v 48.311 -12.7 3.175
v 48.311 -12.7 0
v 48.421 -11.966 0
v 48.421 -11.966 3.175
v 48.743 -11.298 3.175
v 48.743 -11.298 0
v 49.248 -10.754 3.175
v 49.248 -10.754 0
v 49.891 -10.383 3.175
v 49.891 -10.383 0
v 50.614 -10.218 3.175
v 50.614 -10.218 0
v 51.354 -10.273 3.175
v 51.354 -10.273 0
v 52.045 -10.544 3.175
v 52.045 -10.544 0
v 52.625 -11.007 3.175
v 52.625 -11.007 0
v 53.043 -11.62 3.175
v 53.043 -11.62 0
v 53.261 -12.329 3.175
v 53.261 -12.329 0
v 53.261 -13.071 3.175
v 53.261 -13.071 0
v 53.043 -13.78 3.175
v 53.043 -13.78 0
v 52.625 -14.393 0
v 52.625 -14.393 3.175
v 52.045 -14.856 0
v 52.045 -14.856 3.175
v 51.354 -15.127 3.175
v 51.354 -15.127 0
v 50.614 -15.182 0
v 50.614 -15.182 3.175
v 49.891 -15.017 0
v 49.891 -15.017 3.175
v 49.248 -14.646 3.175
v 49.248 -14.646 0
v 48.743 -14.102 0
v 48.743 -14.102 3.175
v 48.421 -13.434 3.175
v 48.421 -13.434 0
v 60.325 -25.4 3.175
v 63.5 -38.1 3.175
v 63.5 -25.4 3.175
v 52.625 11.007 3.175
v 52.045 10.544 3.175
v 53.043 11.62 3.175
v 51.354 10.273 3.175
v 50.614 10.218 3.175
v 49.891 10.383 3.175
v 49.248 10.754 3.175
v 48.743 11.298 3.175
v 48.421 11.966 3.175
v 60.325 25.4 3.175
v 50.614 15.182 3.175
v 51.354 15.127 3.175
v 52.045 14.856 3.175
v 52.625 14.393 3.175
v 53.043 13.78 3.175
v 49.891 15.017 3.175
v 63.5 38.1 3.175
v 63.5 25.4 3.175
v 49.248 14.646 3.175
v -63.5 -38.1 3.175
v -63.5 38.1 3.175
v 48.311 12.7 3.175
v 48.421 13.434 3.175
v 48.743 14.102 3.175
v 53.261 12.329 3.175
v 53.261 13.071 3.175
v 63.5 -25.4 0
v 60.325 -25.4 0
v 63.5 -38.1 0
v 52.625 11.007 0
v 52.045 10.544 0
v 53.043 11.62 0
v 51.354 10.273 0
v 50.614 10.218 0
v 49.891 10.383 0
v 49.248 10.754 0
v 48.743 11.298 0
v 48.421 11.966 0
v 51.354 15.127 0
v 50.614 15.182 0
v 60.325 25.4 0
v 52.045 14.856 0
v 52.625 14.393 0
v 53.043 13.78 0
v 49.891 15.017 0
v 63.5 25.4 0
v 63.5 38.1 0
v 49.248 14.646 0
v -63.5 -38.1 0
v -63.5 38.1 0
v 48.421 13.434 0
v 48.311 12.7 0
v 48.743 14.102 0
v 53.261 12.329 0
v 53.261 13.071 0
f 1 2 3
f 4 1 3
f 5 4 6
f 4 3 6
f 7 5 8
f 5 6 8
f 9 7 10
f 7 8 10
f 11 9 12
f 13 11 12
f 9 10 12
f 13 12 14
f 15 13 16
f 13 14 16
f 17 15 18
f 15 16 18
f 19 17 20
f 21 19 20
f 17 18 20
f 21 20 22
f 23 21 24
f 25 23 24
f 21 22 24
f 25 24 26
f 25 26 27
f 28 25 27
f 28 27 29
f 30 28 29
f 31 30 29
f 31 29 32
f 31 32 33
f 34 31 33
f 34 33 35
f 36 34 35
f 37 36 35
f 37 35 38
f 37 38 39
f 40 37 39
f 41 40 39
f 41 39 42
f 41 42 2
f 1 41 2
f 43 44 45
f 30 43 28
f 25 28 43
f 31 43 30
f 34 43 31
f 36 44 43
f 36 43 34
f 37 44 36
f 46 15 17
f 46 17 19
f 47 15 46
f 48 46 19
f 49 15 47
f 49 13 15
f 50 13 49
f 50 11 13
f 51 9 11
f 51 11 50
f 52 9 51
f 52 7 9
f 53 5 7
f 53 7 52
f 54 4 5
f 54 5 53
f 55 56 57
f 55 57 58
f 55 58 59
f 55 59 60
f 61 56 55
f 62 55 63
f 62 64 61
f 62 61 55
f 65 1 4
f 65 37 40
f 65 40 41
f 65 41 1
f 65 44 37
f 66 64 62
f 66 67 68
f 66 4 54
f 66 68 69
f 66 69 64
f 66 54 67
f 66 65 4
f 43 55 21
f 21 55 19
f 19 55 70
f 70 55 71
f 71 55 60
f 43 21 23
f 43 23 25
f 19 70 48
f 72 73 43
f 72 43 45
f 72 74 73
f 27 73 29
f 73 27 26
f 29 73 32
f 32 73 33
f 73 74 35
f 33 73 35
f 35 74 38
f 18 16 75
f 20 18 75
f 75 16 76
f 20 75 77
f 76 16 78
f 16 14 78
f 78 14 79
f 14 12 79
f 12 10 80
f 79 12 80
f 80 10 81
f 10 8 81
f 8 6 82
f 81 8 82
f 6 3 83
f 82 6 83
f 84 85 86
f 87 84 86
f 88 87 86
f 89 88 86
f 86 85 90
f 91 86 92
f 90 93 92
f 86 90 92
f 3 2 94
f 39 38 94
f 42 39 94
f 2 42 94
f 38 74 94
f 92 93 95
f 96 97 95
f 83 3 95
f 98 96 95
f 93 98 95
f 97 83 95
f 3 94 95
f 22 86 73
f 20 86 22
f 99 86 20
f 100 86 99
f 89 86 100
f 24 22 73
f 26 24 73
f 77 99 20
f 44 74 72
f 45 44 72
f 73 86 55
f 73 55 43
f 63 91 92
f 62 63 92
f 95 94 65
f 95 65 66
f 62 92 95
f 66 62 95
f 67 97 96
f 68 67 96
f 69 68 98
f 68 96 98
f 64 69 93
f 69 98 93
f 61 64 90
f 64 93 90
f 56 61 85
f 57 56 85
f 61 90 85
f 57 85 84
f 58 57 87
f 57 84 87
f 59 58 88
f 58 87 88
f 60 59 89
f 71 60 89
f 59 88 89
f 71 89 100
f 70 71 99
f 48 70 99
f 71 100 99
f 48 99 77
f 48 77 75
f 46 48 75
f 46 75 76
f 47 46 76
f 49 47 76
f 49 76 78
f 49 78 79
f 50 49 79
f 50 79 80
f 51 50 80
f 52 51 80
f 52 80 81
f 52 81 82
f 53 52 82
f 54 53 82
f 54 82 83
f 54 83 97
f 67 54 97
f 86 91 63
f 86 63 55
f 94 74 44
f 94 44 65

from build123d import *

# Parameters (mm, degrees)
SKETCH1_W                  = 76.2
SKETCH1_H                  = 127
BOSS_EXTRUDE1_DEPTH        = 3.175
F_9_0_196_DIAMETER_HOLE1_D = 4.9784
CUT_EXTRUDE1_DEPTH         = 75.121121315
CUT_EXTRUDE1_DEPTH_BACK    = 75.121121315


with BuildPart() as part:
    # Sketch1 → Boss-Extrude1 (new body)
    with BuildSketch(Plane(origin=(0, 0, 0), x_dir=(0, 1, 0), z_dir=(0, 0, 1))):
        Rectangle(SKETCH1_W, SKETCH1_H)
    extrude(amount=BOSS_EXTRUDE1_DEPTH)

    # #9 (0.196) Diameter Hole1 (through all)
    with Locations(Plane.XY.offset(3.175)):
        with Locations((50.8, -12.7), (50.8, 12.7)):
            Hole(F_9_0_196_DIAMETER_HOLE1_D / 2)

    # Sketch4 → Cut-Extrude1 (cut, two sides: drawn at the far end of the back side and taken through both)
    with BuildSketch(Plane.XY.offset(3.175).offset(-CUT_EXTRUDE1_DEPTH_BACK)):
        Polygon((357.480633142, 25.4), (63.5, 25.4), (60.325, 25.4), (60.325, -25.4), (63.5, -25.4), (357.480633142, -25.4), (945.441899427, -25.4), (945.441899427, 25.4), align=None)
    extrude(amount=CUT_EXTRUDE1_DEPTH + CUT_EXTRUDE1_DEPTH_BACK, mode=Mode.SUBTRACT)


solid = part.part
